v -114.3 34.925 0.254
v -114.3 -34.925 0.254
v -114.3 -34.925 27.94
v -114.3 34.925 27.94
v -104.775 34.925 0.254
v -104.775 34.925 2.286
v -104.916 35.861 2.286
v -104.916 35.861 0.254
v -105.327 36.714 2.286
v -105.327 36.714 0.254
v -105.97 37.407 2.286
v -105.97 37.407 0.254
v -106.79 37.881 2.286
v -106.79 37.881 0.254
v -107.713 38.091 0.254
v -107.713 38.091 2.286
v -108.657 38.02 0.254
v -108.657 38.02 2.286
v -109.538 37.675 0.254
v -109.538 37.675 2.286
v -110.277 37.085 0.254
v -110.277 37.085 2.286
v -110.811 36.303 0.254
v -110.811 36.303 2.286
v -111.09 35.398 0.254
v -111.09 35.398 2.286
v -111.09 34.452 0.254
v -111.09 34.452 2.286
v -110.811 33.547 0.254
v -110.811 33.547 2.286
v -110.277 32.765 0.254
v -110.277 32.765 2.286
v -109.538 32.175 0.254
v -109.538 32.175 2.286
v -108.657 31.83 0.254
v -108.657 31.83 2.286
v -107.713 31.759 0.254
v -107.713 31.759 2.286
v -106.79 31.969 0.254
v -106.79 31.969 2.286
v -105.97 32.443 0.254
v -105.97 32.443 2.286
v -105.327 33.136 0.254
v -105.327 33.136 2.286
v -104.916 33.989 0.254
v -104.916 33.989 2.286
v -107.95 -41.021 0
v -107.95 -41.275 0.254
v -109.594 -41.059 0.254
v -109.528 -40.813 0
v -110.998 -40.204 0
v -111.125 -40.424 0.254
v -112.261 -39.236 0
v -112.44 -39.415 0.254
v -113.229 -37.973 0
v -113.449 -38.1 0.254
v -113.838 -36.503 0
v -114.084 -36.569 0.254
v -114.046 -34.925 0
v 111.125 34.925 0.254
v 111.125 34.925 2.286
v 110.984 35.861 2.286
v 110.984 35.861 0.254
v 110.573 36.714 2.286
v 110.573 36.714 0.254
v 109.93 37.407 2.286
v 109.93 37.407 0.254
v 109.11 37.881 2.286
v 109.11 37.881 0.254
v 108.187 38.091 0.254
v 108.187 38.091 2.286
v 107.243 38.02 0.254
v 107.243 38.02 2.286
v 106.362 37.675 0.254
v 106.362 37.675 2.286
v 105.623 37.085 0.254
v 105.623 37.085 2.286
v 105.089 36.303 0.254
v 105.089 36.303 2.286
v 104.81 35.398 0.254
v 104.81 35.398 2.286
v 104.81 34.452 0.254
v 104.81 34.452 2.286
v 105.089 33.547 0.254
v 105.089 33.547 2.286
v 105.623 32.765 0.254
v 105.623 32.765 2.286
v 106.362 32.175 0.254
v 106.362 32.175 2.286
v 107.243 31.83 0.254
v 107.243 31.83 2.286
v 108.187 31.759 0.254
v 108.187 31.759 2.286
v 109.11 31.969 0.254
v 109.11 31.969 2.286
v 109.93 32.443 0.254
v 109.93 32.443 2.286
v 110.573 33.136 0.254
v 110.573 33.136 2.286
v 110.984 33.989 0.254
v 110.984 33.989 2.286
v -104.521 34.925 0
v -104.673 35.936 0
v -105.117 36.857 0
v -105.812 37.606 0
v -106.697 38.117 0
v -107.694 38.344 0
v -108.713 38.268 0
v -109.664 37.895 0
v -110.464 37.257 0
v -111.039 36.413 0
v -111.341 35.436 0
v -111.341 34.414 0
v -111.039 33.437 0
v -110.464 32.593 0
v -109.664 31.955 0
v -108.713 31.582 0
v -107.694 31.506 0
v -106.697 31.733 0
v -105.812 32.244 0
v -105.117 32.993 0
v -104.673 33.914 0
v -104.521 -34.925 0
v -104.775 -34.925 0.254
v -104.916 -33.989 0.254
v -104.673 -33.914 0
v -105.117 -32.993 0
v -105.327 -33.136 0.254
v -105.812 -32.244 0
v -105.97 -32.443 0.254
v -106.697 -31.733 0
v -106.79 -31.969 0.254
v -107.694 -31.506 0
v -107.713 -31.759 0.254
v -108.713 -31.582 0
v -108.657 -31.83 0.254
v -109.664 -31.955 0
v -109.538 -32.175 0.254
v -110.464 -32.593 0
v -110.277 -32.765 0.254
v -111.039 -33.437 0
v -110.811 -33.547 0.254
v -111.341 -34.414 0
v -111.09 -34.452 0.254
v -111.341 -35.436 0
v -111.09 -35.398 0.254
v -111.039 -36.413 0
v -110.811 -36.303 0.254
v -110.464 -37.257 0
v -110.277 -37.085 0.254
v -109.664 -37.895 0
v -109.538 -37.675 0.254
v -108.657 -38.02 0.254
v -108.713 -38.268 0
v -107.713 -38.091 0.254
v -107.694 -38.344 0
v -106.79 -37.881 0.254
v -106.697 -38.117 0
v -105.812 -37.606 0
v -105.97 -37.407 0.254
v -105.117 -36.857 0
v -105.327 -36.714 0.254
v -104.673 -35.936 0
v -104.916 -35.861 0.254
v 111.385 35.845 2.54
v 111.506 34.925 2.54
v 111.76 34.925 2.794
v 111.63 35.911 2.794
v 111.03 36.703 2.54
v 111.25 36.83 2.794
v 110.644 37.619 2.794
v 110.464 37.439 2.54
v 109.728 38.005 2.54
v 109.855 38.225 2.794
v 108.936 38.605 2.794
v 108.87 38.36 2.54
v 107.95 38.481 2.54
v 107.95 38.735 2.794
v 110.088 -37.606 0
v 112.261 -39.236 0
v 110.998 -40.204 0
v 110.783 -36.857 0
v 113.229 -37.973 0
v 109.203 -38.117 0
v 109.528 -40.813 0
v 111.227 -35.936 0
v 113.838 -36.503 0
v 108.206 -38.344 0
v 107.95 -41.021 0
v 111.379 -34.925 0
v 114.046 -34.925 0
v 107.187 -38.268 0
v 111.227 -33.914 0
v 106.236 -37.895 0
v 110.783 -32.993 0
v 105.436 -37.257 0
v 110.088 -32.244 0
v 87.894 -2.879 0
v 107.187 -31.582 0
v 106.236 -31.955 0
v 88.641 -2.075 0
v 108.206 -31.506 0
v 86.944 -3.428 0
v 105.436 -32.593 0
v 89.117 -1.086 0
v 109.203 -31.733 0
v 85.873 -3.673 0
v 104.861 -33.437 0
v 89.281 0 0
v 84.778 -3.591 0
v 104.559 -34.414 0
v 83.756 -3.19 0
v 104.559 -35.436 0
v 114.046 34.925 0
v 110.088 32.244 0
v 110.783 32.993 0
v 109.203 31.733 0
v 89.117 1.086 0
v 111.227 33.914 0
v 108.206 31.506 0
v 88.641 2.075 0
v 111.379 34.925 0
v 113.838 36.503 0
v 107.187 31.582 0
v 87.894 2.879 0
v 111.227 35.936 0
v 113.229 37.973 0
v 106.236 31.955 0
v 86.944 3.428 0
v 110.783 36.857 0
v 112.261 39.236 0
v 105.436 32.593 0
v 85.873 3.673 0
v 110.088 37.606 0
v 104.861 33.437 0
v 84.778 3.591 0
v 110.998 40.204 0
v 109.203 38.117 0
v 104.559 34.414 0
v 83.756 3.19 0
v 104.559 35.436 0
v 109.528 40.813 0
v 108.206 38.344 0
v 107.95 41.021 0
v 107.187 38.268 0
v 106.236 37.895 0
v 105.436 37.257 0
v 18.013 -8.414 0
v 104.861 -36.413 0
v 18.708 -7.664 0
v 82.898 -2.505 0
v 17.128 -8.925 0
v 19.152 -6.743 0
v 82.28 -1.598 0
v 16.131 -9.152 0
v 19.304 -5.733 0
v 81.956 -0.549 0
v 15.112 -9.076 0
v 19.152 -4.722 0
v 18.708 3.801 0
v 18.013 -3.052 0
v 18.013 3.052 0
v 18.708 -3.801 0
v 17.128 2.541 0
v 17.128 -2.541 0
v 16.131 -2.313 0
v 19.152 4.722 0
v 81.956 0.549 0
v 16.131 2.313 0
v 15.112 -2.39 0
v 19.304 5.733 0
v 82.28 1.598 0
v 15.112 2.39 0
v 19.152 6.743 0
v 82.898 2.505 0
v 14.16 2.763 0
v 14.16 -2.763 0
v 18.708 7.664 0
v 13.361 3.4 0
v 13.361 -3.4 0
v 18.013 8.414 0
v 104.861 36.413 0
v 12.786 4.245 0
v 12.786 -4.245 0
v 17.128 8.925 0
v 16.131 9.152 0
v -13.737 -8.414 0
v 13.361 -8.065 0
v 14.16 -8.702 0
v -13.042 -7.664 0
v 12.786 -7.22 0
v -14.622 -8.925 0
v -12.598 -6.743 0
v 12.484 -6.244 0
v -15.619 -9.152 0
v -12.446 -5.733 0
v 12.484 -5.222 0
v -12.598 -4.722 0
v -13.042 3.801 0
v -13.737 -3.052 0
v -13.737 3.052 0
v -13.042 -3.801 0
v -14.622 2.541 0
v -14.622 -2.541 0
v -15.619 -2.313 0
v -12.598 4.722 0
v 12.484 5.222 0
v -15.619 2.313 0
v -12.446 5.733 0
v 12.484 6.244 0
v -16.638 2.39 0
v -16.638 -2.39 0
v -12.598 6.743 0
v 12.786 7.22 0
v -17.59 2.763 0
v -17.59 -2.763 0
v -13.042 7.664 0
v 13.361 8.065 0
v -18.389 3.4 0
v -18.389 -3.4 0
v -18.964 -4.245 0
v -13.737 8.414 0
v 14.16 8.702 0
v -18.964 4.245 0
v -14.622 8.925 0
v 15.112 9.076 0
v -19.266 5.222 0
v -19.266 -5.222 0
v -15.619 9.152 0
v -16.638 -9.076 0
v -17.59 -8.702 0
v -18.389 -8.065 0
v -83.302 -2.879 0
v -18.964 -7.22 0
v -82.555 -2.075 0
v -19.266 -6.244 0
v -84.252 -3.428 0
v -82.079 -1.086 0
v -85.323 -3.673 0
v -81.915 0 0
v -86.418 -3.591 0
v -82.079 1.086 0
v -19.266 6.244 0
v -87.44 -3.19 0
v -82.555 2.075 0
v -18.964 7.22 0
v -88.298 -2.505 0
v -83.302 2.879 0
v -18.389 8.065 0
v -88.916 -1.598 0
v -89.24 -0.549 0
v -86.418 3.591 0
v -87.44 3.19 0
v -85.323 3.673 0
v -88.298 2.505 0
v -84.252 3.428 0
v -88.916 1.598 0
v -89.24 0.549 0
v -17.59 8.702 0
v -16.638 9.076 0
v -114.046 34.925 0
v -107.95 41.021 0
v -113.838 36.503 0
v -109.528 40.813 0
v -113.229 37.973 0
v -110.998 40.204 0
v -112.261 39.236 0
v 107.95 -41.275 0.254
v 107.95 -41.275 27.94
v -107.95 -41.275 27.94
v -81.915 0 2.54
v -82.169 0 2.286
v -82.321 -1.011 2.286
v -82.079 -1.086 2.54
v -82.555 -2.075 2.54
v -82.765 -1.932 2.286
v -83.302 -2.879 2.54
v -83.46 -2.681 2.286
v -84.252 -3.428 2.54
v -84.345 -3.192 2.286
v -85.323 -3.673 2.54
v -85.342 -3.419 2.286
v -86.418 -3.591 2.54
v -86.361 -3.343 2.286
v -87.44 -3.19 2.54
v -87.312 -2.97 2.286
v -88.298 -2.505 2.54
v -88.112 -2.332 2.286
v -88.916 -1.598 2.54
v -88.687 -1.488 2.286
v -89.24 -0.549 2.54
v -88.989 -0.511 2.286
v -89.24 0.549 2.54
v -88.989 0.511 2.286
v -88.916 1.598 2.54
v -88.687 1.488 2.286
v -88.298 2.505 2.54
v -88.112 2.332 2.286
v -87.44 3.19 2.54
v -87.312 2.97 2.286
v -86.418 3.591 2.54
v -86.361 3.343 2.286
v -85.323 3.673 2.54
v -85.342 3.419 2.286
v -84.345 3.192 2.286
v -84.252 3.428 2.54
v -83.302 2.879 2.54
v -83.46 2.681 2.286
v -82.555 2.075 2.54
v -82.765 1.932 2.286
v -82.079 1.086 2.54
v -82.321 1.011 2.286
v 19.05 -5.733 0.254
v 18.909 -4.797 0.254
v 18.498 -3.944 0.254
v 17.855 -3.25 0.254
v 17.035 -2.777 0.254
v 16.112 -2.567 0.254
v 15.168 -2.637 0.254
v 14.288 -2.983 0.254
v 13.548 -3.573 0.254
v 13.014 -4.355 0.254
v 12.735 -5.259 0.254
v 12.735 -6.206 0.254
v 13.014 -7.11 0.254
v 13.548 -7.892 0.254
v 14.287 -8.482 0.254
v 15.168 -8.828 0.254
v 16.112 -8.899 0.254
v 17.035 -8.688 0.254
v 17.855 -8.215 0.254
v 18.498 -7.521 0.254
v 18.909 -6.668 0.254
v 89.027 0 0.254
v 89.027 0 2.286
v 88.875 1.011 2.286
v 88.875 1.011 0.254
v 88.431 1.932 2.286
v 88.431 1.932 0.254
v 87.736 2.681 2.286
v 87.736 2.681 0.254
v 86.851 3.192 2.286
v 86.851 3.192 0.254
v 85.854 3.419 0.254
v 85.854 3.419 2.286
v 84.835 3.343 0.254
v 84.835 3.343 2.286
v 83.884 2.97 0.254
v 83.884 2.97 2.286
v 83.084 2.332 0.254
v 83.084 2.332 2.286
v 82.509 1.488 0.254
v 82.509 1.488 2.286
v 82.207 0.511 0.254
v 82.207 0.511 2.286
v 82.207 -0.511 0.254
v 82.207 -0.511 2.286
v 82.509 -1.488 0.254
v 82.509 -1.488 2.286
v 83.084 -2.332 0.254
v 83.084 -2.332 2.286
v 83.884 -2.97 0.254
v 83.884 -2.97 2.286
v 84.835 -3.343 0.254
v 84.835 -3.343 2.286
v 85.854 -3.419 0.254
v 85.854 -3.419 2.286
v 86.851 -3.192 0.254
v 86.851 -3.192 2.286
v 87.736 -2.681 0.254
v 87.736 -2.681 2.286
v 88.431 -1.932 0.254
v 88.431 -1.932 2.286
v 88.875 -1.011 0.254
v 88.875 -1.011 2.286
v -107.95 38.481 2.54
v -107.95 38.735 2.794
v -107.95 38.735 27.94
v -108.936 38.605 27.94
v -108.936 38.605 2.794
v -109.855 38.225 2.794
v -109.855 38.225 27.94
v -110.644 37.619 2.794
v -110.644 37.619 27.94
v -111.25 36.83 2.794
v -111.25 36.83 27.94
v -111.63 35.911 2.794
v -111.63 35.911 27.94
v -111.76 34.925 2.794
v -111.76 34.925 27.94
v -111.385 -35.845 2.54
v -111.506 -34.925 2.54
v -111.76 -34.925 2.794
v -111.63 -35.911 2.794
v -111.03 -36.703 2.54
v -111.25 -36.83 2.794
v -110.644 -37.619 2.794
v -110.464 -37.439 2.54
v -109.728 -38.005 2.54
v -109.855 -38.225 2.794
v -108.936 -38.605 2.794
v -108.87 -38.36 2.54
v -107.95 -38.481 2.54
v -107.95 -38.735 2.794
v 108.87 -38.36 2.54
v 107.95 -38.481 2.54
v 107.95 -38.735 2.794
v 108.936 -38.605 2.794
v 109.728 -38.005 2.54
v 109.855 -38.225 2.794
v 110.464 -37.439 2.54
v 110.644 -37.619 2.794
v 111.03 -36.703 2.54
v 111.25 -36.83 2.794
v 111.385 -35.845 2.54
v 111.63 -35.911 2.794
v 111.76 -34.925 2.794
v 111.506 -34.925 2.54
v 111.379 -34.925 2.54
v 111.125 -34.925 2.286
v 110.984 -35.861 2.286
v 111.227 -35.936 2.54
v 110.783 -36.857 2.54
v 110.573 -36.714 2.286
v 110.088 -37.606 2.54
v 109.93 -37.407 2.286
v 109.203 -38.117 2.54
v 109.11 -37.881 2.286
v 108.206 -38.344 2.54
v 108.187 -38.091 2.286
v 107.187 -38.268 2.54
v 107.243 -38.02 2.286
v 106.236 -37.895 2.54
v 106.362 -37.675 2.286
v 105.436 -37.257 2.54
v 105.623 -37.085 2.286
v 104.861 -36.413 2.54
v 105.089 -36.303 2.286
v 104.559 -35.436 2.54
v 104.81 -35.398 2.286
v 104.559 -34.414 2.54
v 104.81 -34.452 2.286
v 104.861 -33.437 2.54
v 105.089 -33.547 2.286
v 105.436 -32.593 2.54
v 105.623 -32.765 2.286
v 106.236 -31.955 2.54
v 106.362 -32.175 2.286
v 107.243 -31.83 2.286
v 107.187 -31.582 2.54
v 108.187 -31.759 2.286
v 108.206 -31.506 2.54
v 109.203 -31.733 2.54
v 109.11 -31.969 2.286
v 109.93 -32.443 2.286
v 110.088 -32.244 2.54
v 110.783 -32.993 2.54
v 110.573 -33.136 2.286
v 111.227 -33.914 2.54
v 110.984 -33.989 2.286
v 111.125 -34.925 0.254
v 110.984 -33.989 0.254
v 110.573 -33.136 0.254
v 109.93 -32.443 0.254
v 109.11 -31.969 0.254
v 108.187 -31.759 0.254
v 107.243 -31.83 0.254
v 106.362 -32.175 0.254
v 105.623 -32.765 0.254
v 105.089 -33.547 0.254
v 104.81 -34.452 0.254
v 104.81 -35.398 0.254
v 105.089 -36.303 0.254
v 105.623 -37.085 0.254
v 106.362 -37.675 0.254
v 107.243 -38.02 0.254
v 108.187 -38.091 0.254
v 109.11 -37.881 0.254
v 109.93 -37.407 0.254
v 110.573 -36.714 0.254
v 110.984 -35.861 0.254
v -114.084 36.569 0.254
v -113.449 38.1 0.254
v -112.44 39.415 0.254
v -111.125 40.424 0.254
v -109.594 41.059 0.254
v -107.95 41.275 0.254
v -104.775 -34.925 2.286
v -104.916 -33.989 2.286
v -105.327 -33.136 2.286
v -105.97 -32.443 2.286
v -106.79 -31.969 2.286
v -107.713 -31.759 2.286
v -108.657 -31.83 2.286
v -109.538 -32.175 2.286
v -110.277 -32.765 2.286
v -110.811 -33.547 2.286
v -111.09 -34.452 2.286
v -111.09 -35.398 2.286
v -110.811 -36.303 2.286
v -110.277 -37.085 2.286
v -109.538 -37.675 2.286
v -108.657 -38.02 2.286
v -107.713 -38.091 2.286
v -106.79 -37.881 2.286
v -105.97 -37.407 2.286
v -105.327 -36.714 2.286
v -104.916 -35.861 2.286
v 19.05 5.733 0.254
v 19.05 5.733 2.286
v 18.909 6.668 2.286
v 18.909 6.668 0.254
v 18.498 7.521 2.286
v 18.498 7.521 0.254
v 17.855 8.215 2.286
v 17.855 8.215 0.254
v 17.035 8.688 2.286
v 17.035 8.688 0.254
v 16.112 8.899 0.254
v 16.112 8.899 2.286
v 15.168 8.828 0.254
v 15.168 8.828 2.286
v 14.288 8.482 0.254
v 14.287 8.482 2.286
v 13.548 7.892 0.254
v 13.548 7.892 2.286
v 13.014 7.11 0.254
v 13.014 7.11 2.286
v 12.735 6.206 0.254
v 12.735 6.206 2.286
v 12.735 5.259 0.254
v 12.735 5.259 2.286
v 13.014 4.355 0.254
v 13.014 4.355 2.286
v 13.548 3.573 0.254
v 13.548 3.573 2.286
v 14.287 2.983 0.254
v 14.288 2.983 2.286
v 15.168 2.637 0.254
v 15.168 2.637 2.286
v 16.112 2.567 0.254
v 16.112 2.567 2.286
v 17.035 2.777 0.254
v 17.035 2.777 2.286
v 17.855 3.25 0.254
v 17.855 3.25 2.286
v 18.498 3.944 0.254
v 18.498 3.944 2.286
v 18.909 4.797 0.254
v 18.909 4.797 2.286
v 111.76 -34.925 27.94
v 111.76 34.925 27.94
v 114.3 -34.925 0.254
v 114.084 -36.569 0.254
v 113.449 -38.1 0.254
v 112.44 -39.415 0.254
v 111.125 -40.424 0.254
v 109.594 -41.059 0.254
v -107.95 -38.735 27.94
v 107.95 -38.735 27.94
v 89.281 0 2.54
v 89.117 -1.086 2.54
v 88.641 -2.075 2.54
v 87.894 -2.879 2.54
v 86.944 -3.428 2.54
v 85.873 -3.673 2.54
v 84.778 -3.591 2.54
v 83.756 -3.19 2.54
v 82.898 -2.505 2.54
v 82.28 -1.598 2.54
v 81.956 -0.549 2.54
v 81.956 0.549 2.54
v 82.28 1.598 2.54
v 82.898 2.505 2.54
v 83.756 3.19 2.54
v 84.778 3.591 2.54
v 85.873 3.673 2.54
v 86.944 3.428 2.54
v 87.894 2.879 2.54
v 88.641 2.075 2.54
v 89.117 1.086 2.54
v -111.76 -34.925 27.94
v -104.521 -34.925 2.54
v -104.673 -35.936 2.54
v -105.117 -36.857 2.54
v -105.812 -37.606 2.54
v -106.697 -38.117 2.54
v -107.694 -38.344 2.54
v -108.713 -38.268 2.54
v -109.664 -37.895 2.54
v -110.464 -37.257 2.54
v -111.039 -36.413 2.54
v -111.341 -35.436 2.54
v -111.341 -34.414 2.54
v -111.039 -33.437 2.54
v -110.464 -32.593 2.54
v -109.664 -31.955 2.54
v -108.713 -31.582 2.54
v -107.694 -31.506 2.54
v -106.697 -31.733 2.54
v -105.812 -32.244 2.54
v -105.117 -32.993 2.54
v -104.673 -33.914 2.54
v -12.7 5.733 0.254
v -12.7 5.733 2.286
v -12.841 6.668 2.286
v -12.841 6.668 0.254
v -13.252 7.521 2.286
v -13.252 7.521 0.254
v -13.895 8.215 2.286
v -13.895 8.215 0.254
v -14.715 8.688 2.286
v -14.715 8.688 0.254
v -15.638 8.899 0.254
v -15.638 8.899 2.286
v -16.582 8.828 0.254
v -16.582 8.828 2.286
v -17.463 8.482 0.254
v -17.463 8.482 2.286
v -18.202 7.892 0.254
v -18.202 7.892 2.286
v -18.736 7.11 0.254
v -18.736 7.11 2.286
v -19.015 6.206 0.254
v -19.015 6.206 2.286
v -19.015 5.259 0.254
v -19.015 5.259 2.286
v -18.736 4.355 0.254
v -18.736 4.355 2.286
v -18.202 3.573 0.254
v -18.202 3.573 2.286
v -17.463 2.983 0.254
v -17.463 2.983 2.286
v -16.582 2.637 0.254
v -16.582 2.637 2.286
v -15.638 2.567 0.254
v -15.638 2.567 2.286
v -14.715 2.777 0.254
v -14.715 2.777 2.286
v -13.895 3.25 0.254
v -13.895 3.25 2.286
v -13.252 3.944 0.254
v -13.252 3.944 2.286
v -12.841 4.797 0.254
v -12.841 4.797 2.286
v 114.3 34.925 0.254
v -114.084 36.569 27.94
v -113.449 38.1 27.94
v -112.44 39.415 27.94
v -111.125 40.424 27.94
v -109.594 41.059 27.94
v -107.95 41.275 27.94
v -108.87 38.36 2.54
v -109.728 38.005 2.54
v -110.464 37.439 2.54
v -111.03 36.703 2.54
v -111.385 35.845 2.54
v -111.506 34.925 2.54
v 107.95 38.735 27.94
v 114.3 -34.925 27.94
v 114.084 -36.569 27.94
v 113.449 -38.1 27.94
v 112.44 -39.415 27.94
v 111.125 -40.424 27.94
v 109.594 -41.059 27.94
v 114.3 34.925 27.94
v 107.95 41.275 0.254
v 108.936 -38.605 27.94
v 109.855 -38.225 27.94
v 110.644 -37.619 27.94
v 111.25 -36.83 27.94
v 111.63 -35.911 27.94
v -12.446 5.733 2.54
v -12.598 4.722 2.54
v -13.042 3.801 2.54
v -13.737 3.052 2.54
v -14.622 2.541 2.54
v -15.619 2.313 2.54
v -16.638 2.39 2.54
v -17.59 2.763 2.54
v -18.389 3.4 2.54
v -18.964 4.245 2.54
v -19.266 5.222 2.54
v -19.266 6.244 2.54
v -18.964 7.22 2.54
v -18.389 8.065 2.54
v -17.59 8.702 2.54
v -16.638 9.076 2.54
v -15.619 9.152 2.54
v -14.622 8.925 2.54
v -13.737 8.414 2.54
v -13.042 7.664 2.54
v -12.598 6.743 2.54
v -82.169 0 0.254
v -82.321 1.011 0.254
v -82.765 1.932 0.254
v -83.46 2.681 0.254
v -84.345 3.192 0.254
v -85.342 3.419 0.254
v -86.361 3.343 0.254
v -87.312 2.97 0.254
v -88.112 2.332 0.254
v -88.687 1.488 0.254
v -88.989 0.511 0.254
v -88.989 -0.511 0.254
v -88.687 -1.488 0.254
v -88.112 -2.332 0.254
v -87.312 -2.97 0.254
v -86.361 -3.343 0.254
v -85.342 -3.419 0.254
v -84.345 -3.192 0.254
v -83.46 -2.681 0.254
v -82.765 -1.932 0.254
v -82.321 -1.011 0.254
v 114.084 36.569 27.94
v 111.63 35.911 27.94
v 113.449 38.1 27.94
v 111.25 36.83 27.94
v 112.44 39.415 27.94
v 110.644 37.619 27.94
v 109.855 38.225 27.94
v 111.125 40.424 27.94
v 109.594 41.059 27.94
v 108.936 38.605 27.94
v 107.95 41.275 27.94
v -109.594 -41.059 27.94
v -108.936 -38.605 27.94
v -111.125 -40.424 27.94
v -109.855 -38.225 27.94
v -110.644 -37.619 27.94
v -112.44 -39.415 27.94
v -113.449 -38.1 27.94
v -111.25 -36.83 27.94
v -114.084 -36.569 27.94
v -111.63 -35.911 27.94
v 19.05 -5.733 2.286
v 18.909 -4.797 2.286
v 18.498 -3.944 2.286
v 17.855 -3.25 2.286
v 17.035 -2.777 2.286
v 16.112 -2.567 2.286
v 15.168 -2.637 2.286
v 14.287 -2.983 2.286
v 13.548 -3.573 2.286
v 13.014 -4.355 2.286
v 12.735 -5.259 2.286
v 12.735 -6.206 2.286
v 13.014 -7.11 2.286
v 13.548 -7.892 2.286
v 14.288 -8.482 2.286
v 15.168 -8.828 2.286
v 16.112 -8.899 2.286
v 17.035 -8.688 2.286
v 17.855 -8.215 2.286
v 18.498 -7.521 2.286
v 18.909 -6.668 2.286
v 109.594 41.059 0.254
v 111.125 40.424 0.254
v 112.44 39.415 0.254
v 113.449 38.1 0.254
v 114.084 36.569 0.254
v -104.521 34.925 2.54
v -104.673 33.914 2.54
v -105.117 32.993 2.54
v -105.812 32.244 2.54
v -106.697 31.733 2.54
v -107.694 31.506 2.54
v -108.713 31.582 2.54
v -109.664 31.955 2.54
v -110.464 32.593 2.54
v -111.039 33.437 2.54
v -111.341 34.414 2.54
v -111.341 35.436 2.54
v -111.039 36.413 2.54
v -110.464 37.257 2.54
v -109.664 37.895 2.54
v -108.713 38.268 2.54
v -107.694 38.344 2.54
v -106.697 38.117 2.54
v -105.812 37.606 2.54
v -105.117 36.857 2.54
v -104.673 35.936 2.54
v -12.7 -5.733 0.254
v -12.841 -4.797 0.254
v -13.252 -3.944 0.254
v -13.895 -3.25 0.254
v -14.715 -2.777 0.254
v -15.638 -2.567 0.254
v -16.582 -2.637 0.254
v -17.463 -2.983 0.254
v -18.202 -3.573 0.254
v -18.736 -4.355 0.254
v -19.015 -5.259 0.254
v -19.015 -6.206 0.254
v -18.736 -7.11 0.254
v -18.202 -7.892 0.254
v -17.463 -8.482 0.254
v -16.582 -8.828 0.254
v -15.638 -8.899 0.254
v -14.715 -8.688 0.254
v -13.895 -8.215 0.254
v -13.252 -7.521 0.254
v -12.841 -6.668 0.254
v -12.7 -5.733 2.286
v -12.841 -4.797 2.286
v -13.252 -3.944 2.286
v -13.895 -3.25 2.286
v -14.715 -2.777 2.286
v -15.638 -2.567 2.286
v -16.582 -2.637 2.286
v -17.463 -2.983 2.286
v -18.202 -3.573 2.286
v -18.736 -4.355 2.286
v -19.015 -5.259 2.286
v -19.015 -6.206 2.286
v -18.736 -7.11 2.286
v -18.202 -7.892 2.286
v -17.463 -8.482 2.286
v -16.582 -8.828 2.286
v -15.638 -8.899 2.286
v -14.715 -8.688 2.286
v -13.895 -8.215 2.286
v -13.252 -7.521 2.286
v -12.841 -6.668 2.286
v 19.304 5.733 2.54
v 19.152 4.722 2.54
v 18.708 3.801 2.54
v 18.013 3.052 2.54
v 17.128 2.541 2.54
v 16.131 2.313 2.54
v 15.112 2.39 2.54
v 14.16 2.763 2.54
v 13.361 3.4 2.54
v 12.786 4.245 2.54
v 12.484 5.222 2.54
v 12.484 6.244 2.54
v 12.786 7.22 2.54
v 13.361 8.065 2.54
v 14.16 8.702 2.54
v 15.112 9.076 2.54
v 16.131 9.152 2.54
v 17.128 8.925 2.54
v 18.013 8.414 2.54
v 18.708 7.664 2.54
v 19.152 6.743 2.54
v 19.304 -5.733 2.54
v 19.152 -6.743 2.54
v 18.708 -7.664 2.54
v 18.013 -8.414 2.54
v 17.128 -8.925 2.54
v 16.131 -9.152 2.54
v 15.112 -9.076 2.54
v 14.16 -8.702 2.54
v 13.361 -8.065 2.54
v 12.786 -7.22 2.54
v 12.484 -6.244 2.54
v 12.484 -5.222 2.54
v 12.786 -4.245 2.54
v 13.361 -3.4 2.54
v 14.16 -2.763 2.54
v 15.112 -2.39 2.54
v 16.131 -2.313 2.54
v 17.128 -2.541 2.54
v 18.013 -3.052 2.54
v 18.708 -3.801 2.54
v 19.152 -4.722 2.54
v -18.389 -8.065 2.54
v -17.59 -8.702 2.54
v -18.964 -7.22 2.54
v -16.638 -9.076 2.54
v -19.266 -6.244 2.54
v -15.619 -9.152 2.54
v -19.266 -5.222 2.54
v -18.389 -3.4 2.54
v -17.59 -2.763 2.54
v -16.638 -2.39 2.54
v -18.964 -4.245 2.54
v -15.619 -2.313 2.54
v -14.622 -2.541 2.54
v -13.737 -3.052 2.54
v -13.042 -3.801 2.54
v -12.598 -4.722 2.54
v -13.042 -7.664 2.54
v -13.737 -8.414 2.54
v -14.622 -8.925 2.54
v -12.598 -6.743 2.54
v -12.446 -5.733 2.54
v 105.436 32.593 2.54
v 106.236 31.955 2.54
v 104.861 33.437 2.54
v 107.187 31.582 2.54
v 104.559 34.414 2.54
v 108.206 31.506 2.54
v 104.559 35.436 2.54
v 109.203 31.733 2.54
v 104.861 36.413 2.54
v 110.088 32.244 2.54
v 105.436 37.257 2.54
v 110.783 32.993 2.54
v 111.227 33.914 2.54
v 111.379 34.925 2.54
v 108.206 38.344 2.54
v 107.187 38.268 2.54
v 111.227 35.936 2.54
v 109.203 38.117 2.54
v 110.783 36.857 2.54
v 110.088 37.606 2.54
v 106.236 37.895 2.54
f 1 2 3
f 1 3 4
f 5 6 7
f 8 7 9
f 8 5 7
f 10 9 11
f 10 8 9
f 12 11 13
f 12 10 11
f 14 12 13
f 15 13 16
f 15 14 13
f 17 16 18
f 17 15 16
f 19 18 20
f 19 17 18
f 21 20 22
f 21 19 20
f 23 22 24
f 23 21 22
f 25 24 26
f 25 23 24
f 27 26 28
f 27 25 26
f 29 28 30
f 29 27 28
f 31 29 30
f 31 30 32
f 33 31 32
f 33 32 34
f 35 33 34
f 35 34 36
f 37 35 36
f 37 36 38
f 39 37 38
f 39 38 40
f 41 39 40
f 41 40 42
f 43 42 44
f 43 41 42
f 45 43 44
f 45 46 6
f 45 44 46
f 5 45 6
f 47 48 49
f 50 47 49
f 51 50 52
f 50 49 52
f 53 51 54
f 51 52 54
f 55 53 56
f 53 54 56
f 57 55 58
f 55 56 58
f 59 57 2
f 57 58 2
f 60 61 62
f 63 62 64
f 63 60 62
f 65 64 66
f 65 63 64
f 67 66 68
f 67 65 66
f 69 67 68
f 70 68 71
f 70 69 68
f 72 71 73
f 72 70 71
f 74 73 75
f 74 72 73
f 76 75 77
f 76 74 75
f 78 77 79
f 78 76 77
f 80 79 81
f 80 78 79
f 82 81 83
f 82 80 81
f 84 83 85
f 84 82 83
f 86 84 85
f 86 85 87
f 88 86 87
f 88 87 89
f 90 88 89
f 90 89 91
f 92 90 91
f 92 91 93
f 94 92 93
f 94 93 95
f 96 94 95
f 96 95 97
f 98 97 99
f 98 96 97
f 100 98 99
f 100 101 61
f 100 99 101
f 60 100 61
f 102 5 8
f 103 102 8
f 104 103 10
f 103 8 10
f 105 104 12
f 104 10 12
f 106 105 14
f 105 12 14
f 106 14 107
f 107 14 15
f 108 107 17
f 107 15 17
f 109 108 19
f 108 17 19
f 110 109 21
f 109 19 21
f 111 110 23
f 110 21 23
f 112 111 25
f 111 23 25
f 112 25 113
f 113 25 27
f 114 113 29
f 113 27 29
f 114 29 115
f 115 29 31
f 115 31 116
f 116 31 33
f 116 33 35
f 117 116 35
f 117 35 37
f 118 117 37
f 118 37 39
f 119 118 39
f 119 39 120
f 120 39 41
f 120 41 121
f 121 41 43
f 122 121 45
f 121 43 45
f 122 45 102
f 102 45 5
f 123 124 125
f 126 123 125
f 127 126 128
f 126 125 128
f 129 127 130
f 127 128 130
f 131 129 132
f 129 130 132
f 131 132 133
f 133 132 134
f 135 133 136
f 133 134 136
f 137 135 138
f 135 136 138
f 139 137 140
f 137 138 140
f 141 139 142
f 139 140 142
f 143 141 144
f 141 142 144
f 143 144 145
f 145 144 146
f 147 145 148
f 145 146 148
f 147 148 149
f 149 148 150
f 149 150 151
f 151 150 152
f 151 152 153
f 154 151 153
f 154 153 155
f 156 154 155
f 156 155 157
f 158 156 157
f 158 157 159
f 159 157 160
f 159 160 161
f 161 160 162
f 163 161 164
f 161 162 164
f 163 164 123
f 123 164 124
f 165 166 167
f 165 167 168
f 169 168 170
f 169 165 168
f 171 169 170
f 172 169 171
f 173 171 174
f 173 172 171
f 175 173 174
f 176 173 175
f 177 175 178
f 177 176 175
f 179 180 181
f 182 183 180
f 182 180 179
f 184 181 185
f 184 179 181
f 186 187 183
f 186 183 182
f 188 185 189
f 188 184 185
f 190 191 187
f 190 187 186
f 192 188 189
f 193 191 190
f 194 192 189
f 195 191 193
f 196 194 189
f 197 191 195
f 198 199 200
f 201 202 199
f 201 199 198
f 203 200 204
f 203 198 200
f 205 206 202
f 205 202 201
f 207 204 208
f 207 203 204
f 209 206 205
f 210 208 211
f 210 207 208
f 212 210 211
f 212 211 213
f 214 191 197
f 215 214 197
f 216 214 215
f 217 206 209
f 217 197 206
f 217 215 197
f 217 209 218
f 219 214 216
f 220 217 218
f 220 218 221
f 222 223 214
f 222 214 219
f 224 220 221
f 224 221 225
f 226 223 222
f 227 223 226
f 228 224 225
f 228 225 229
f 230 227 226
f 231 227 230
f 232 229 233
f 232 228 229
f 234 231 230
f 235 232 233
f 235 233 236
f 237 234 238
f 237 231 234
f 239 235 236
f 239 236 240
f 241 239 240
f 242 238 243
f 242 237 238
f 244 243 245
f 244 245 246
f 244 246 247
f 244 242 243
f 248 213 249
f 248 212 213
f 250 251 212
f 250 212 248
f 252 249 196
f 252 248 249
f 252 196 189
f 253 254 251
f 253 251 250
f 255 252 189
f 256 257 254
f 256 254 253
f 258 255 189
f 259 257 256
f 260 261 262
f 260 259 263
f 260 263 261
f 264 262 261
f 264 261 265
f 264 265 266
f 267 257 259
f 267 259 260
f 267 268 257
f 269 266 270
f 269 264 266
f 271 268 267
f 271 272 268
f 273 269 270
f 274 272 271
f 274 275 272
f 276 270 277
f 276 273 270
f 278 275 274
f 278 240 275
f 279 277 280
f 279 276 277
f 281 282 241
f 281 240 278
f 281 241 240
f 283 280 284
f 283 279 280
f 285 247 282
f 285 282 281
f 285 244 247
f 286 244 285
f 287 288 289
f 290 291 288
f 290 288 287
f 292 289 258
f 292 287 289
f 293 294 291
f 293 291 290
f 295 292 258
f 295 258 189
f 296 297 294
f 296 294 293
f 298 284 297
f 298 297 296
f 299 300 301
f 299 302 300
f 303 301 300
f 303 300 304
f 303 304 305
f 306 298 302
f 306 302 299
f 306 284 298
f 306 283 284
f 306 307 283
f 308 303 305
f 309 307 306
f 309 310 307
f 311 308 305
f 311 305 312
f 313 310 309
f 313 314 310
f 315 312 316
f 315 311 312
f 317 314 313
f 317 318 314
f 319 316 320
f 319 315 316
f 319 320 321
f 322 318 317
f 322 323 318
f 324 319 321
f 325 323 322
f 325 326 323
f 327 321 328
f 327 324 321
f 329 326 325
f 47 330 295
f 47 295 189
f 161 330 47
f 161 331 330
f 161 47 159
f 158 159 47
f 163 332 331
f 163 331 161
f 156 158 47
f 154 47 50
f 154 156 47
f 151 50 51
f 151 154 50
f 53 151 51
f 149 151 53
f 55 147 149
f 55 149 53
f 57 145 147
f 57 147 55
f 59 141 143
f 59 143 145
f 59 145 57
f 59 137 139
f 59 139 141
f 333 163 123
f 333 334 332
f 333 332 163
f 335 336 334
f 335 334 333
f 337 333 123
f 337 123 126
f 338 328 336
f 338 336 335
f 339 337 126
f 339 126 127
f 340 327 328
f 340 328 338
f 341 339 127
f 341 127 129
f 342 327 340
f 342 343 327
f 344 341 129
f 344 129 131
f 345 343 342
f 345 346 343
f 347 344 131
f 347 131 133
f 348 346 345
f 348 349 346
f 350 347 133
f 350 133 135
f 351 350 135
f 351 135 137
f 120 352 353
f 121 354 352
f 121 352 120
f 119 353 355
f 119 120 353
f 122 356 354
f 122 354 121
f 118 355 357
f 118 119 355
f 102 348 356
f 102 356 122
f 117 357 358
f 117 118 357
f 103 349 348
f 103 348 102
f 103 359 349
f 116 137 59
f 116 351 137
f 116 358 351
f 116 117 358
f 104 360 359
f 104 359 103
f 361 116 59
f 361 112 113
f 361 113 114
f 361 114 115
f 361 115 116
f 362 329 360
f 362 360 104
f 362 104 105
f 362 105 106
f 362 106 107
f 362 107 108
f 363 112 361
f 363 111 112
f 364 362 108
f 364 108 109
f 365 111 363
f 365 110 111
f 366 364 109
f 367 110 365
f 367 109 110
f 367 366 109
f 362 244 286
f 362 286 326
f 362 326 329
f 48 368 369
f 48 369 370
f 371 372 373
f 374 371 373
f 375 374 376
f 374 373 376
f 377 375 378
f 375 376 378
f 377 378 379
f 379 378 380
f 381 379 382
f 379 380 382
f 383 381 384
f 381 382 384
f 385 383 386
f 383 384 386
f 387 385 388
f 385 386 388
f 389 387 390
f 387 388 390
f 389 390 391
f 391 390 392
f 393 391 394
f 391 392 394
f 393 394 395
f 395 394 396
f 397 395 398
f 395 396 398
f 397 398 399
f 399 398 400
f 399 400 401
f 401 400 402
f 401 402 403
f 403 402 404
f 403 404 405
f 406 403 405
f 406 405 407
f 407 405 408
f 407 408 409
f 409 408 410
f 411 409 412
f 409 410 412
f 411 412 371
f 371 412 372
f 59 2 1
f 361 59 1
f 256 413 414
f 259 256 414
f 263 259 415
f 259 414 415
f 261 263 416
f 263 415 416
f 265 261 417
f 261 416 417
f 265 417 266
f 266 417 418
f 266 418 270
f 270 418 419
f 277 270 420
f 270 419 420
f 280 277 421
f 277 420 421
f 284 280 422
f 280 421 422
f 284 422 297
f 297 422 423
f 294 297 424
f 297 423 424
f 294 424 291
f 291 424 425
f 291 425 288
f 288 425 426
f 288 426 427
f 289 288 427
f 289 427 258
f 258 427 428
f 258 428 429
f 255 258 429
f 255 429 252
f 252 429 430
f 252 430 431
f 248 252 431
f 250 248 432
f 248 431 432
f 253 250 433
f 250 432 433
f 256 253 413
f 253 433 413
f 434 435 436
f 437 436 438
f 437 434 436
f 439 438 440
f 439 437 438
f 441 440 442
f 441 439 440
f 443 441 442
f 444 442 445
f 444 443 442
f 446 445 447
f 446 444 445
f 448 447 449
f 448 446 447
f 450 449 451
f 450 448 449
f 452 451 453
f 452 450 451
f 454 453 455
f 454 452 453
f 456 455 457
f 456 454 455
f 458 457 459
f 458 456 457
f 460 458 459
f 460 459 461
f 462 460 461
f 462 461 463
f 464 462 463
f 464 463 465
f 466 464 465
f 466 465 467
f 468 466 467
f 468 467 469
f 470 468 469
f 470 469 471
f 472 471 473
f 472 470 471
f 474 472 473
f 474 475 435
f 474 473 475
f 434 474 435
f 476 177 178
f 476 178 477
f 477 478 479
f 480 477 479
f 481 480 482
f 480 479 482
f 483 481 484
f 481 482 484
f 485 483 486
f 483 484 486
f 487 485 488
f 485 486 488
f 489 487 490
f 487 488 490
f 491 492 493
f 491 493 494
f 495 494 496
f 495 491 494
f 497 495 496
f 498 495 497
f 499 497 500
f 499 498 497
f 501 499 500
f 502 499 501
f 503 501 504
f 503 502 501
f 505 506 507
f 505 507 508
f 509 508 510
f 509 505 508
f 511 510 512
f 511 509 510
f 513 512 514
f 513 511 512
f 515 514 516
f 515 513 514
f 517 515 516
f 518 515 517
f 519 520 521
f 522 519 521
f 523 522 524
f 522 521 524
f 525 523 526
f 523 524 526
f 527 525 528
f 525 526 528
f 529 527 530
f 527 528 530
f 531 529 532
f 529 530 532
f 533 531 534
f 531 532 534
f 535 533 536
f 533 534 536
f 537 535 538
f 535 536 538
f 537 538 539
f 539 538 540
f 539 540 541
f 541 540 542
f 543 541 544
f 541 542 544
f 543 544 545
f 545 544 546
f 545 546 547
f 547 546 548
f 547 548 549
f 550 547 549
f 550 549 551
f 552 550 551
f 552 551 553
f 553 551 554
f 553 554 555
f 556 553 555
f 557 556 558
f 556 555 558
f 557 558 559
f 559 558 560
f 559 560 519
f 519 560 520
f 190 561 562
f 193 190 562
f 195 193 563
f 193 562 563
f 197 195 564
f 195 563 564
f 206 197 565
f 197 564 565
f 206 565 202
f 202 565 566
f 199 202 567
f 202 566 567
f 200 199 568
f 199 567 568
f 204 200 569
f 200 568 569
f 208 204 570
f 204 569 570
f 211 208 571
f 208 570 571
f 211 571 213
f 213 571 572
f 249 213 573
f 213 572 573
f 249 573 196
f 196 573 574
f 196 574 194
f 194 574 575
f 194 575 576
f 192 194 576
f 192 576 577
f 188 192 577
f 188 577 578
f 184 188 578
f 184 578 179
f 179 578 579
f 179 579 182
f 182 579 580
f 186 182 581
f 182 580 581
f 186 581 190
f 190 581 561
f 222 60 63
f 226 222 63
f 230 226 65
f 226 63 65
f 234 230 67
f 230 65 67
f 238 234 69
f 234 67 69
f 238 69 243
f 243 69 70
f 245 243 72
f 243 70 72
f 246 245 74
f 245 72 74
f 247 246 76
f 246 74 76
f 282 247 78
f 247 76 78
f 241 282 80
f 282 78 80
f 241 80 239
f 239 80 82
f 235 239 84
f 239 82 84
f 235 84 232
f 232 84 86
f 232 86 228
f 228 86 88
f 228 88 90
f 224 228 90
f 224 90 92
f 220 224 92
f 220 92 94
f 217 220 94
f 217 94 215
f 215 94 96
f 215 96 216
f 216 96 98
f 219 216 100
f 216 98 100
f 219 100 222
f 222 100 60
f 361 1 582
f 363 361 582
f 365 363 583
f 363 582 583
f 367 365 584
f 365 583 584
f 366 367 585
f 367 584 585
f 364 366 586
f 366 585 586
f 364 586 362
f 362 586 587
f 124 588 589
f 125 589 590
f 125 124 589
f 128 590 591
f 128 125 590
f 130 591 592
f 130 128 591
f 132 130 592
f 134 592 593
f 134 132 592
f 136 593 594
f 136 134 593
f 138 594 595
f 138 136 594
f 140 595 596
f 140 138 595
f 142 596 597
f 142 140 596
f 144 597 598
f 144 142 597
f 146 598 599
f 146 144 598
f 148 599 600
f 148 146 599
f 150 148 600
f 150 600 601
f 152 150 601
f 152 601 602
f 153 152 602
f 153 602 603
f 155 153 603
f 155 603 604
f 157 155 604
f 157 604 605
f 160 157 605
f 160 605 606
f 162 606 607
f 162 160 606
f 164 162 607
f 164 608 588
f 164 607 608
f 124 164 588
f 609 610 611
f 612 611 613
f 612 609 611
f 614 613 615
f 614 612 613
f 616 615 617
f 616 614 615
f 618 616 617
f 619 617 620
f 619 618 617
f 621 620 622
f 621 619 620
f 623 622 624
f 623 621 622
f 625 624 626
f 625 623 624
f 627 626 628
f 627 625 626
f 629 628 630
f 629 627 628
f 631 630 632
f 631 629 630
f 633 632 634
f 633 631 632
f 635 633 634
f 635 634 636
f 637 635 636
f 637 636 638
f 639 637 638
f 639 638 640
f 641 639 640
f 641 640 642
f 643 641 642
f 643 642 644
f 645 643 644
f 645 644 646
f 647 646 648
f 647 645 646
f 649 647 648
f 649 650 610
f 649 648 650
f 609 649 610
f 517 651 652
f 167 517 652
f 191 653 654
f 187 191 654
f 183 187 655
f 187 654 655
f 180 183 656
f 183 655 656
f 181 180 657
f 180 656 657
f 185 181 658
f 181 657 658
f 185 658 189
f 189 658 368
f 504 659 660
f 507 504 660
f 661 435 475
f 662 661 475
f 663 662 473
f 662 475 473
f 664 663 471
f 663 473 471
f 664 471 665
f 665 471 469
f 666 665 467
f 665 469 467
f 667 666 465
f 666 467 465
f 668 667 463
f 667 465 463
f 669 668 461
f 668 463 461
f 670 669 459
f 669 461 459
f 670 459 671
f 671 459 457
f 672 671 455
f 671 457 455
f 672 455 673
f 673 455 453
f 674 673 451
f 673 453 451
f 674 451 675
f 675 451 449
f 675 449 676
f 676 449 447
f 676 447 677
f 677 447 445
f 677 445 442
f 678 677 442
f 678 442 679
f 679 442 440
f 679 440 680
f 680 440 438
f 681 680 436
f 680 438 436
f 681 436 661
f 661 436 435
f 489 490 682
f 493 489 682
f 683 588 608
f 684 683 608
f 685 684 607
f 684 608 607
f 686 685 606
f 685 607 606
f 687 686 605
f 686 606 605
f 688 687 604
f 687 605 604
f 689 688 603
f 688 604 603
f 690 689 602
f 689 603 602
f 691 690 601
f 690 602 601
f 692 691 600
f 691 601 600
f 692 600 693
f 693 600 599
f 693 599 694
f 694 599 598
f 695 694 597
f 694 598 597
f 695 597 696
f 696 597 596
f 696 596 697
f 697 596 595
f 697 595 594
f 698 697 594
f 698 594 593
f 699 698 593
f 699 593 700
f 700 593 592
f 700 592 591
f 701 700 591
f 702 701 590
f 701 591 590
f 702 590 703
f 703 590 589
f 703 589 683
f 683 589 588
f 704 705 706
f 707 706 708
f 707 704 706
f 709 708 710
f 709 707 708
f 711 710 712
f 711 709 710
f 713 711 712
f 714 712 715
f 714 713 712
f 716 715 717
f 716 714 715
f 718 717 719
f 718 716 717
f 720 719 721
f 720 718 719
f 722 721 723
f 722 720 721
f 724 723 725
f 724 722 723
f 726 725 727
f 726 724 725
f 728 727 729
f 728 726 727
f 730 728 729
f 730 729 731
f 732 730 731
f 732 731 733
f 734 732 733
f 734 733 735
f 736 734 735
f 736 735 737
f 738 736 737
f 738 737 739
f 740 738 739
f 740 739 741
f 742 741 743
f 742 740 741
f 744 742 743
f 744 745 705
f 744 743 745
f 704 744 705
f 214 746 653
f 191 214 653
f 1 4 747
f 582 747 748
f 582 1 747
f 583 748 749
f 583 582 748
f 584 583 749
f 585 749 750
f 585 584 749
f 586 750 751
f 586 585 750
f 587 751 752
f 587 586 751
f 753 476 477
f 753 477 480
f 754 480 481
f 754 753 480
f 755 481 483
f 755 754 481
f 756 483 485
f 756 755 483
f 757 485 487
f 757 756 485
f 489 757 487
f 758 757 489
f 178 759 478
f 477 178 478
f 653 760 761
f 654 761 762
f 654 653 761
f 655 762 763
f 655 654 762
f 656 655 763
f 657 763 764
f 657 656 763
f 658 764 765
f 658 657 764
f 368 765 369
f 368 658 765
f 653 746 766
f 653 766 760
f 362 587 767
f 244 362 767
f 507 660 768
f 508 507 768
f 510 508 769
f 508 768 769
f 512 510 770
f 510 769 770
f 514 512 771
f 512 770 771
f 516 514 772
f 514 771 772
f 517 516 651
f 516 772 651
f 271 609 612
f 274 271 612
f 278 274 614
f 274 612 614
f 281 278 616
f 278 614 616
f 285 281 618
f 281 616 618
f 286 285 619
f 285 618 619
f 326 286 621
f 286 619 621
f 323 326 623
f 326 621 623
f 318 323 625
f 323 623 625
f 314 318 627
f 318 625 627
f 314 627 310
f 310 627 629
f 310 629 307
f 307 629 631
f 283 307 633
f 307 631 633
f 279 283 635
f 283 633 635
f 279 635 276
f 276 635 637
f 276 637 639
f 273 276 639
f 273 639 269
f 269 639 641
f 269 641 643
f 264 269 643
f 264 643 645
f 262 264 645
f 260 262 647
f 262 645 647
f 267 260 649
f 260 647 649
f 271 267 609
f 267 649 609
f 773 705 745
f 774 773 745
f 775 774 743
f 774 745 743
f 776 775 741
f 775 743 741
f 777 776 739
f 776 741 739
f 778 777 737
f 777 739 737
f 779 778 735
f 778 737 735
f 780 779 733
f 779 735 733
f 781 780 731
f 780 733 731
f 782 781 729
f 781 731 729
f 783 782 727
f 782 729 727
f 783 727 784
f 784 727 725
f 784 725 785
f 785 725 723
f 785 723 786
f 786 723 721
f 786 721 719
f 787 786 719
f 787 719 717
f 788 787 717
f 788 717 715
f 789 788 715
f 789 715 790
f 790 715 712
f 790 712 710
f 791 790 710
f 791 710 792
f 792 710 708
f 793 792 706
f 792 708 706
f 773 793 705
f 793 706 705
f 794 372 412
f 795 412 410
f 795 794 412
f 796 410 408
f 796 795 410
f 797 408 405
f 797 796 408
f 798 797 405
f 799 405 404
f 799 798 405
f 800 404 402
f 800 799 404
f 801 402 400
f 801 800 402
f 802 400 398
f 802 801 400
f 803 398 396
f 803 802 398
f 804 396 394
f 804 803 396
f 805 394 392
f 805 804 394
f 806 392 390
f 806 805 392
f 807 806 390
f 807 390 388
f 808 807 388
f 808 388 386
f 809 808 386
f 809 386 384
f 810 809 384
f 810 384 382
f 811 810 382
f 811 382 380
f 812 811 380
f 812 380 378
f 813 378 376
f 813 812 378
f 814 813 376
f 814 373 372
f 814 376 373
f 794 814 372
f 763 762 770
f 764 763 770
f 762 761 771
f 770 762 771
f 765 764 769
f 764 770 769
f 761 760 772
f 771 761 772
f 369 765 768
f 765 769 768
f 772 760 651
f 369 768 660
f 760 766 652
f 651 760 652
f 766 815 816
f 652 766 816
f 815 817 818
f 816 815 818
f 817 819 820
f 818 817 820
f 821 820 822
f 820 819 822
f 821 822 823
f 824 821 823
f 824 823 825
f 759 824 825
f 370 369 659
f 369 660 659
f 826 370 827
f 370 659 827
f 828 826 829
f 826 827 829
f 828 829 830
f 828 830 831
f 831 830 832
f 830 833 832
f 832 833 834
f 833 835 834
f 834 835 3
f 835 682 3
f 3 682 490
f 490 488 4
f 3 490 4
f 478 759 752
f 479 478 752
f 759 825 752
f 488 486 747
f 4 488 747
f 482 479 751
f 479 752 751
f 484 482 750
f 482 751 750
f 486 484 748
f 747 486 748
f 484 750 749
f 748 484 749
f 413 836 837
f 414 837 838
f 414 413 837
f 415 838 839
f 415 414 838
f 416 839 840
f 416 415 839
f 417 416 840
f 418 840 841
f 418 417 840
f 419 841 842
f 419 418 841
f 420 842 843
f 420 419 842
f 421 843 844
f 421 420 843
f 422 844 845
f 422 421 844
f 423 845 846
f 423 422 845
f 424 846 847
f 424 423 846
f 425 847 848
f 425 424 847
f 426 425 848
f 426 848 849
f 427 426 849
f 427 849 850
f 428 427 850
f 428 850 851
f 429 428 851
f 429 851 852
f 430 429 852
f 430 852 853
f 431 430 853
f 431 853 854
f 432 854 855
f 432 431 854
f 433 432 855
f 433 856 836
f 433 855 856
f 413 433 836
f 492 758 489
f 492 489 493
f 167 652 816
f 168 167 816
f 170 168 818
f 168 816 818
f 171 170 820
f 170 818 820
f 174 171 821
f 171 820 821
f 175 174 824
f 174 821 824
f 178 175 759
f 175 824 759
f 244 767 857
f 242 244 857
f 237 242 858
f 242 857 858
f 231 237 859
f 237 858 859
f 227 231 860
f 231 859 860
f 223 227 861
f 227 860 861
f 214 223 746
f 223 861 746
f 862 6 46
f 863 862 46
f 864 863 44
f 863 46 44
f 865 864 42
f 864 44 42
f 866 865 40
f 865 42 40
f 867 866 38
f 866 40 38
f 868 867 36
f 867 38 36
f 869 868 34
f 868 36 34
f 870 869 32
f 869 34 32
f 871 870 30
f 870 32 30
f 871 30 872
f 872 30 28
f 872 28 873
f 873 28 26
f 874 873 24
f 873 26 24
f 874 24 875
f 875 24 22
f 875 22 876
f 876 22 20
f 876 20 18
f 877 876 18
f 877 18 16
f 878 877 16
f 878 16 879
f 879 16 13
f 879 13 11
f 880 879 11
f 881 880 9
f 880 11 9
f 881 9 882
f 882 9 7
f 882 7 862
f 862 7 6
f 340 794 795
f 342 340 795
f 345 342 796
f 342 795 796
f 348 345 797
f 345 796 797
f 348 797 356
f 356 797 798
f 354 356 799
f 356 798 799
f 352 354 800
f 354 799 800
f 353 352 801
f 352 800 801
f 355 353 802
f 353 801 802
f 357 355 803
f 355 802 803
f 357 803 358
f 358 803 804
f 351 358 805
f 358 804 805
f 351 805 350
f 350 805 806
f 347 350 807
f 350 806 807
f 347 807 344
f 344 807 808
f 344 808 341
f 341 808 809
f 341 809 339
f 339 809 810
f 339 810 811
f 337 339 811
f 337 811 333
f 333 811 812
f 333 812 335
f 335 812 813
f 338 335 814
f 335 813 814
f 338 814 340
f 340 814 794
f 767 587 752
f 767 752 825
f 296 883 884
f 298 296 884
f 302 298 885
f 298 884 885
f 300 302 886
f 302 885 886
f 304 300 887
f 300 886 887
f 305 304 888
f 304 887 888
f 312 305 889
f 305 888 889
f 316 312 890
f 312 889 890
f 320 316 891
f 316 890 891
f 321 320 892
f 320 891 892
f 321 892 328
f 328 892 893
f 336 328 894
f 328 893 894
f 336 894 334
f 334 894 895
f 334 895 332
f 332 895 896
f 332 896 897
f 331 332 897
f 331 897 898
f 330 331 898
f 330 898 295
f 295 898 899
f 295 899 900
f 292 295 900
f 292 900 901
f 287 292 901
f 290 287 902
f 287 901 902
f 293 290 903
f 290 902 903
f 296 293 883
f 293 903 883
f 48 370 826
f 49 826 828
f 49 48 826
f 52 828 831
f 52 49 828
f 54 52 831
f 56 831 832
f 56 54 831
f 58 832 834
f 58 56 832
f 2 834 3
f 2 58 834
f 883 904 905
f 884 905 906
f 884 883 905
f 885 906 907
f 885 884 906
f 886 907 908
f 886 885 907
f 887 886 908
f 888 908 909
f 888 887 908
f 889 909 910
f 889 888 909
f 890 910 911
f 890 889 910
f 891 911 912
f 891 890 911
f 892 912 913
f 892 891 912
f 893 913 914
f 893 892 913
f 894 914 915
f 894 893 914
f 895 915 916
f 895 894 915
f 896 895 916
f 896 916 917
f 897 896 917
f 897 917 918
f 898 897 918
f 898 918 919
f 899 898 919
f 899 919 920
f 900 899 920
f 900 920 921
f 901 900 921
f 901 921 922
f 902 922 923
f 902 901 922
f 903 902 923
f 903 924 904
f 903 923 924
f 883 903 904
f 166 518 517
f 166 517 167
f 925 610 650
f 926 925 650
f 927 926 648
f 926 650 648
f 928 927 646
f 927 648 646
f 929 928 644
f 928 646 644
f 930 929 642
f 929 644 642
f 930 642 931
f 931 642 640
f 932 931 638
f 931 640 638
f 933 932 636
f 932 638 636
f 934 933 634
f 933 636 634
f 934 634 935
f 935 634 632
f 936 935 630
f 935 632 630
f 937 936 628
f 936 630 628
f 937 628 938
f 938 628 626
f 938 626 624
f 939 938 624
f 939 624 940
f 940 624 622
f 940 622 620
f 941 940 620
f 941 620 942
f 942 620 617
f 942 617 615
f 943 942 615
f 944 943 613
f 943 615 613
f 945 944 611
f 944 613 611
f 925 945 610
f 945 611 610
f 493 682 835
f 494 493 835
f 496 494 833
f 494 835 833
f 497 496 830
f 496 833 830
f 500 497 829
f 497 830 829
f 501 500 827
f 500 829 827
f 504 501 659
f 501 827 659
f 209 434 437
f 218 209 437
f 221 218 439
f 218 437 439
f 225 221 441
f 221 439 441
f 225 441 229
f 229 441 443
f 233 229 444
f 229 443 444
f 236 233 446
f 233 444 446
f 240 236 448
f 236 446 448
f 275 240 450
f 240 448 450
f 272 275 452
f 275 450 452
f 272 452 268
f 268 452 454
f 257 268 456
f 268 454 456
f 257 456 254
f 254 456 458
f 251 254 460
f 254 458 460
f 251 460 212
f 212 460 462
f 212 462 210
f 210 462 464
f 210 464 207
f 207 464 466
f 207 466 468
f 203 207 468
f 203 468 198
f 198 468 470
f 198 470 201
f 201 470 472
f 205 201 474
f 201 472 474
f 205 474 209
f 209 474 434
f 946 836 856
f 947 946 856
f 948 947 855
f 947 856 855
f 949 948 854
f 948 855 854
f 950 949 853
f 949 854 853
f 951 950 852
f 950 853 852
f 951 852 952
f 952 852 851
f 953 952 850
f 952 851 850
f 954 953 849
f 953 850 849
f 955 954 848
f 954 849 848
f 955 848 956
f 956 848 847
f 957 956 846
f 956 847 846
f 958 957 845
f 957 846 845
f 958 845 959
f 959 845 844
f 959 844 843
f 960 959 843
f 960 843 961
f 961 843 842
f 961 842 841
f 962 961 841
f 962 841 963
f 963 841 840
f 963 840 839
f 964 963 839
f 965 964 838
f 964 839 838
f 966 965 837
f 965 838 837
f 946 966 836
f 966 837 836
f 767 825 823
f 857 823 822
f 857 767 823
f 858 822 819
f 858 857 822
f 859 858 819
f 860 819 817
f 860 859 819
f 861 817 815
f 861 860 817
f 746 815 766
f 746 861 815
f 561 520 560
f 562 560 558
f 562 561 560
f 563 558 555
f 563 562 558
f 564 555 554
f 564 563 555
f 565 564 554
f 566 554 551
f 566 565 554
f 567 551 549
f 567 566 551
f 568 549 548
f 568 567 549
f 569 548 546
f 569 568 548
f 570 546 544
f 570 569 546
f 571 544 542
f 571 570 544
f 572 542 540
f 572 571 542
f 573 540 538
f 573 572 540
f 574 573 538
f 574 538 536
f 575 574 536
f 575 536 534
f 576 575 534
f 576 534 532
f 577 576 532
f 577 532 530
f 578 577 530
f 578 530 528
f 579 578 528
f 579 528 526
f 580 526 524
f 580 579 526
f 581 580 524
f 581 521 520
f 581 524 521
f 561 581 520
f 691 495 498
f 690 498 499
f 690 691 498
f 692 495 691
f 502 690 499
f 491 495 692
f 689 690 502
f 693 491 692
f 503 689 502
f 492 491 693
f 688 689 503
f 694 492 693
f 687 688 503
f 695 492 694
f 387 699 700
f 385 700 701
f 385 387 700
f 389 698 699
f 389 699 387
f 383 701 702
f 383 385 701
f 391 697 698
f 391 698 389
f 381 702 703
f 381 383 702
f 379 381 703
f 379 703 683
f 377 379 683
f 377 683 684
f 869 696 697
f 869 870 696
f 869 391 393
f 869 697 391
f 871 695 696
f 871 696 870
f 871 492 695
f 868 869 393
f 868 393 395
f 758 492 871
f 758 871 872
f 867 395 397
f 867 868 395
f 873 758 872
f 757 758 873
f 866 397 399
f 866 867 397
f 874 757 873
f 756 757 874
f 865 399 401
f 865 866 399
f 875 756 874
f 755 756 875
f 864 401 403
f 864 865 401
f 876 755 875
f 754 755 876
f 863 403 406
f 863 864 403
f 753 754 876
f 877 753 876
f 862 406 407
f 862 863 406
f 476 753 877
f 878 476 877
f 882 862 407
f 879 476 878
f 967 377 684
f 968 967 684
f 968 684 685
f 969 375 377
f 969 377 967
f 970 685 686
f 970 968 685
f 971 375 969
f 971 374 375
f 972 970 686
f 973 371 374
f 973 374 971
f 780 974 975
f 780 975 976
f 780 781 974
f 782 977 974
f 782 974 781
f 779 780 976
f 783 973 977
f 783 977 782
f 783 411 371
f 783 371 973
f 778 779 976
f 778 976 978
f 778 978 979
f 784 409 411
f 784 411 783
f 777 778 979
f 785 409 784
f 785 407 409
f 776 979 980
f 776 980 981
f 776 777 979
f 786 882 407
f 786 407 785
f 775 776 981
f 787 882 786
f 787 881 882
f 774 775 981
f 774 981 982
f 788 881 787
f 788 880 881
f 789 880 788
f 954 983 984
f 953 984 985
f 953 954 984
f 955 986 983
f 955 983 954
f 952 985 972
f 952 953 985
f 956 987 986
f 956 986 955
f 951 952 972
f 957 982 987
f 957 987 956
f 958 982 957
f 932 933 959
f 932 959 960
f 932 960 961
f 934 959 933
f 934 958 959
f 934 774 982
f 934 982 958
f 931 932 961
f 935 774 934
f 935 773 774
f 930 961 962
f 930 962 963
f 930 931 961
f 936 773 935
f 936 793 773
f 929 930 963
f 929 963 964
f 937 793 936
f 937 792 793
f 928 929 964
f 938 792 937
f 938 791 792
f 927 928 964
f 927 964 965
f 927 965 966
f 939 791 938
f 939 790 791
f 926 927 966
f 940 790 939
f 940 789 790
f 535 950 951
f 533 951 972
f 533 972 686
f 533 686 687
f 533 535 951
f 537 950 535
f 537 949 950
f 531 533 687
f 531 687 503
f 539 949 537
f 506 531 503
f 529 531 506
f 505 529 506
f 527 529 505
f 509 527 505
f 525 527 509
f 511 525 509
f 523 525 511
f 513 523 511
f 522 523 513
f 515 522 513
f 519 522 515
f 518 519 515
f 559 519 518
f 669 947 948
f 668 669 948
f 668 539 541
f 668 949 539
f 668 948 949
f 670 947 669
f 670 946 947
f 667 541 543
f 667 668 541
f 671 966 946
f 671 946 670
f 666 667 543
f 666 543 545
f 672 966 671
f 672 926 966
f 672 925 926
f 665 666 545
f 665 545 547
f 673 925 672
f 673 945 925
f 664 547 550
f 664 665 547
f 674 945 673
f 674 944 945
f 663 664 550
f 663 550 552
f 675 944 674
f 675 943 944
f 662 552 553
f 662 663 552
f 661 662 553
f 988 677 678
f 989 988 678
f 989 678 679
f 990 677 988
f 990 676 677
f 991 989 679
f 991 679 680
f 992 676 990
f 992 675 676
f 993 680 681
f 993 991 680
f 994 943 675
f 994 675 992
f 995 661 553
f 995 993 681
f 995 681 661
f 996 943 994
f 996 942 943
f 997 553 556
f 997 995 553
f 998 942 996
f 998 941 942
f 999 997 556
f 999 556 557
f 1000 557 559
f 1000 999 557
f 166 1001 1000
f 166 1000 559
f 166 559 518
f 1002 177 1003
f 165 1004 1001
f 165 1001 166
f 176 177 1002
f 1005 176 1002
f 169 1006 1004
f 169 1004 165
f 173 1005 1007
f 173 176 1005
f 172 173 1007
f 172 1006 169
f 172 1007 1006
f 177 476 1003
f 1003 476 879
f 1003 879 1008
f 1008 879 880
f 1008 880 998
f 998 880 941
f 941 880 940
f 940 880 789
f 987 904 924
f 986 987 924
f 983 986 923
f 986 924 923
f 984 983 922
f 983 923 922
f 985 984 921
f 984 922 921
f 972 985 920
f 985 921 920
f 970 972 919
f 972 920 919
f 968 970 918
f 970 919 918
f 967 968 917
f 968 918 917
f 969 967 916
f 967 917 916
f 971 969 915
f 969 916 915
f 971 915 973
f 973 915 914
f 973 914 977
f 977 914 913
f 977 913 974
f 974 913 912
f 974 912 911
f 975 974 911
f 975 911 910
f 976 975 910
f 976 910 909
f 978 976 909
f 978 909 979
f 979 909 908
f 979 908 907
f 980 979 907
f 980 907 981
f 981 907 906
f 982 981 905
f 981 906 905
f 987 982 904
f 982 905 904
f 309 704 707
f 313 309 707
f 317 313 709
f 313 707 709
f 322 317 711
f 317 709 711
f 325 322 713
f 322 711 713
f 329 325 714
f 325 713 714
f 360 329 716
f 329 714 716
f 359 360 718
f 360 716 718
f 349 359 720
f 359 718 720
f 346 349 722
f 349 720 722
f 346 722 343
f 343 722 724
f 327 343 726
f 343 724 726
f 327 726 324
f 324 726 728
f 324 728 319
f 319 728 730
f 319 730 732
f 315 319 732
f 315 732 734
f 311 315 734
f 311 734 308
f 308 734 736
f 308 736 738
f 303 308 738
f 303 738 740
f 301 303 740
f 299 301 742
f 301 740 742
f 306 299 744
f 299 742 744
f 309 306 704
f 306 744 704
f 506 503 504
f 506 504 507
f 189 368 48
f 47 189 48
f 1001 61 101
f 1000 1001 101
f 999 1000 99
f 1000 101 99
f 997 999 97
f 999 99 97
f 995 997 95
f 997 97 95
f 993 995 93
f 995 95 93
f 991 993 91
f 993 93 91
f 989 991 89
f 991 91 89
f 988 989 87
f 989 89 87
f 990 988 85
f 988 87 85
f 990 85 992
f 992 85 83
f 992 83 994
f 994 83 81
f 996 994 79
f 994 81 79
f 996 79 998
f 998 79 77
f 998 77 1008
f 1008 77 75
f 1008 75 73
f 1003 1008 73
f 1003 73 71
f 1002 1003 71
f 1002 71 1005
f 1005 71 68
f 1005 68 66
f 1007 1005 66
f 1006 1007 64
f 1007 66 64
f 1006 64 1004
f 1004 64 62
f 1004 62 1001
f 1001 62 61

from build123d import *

# Parameters (mm, degrees)
SKETCH3_R           = 3.175
SKETCH3_R_2         = 3.429
BOSS_EXTRUDE1_DEPTH = 27.94
CUT_EXTRUDE1_DEPTH  = 25.4
CHAMFER1_SIZE       = 0.254
CHAMFER2_SIZE       = 0.254


with BuildPart() as part:
    # Sketch3 → Boss-Extrude1 (new body)
    with BuildSketch(Plane.XY):
        with BuildLine():
            Line((107.95, -41.275), (-107.95, -41.275))
            ThreePointArc((-107.95, -41.275), (-112.440128061, -39.415128061), (-114.3, -34.925))
            Line((-114.3, -34.925), (-114.3, 34.925))
            ThreePointArc((-114.3, 34.925), (-112.440128061, 39.415128061), (-107.95, 41.275))
            Line((-107.95, 41.275), (107.95, 41.275))
            ThreePointArc((107.95, 41.275), (112.440128061, 39.415128061), (114.3, 34.925))
            Line((114.3, 34.925), (114.3, -34.925))
            ThreePointArc((114.3, -34.925), (112.440128061, -39.415128061), (107.95, -41.275))
        make_face()
        with Locations((-107.95, 34.925)):
            Circle(SKETCH3_R, mode=Mode.SUBTRACT)
        with Locations((-107.95, -34.925)):
            Circle(SKETCH3_R, mode=Mode.SUBTRACT)
        with Locations((107.95, -34.925)):
            Circle(SKETCH3_R, mode=Mode.SUBTRACT)
        with Locations((107.95, 34.925)):
            Circle(SKETCH3_R, mode=Mode.SUBTRACT)
        with Locations((-85.598, 0)):
            Circle(SKETCH3_R_2, mode=Mode.SUBTRACT)
        with Locations((85.598, 0)):
            Circle(SKETCH3_R_2, mode=Mode.SUBTRACT)
        with Locations((-15.875, 5.732638889)):
            Circle(SKETCH3_R, mode=Mode.SUBTRACT)
        with Locations((15.875, 5.732638889)):
            Circle(SKETCH3_R, mode=Mode.SUBTRACT)
        with Locations((15.875, -5.732638889)):
            Circle(SKETCH3_R, mode=Mode.SUBTRACT)
        with Locations((-15.875, -5.732638889)):
            Circle(SKETCH3_R, mode=Mode.SUBTRACT)
    extrude(amount=BOSS_EXTRUDE1_DEPTH)

    # Sketch4 → Cut-Extrude1 (cut)
    with BuildSketch(Plane.XY.offset(27.94)):
        with BuildLine():
            Line((107.95, 38.735), (-107.95, 38.735))
            ThreePointArc((-107.95, 38.735), (-110.644076836, 37.619076836), (-111.76, 34.925))
            Line((-111.76, 34.925), (-111.76, -34.925))
            ThreePointArc((-111.76, -34.925), (-110.644076836, -37.619076836), (-107.95, -38.735))
            Line((-107.95, -38.735), (107.95, -38.735))
            ThreePointArc((107.95, -38.735), (110.644076836, -37.619076836), (111.76, -34.925))
            Line((111.76, -34.925), (111.76, 34.925))
            ThreePointArc((111.76, 34.925), (110.644076836, 37.619076836), (107.95, 38.735))
        make_face()
    extrude(amount=-CUT_EXTRUDE1_DEPTH, mode=Mode.SUBTRACT)

    # Chamfer1
    chamfer1_edges = [part.edges().sort_by_distance(p)[0] for p in [
        (0, 41.275, 0),
        (112.440128061, 39.415128061, 0),
        (-89.027, 0, 0),
        (82.169, 0, 0),
        (-111.125, 34.925, 0),
        (-111.125, -34.925, 0),
        (104.775, -34.925, 0),
        (104.775, 34.925, 0),
        (-19.05, 5.732638889, 0),
        (12.7, 5.732638889, 0),
        (12.7, -5.732638889, 0),
        (-19.05, -5.732638889, 0),
        (114.3, 0, 0),
        (112.440128061, -39.415128061, 0),
        (0, -41.275, 0),
        (-112.440128061, -39.415128061, 0),
        (-114.3, 0, 0),
        (-112.440128061, 39.415128061, 0),
    ]]
    chamfer(chamfer1_edges, length=CHAMFER1_SIZE)

    # Chamfer2
    chamfer2_edges = [part.edges().sort_by_distance(p)[0] for p in [
        (111.76, 0, 2.54),
        (110.644076836, -37.619076836, 2.54),
        (0, -38.735, 2.54),
        (-110.644076836, -37.619076836, 2.54),
        (-111.76, 0, 2.54),
        (-110.644076836, 37.619076836, 2.54),
        (0, 38.735, 2.54),
        (110.644076836, 37.619076836, 2.54),
        (-89.027, 0, 2.54),
        (82.169, 0, 2.54),
        (-111.125, 34.925, 2.54),
        (-111.125, -34.925, 2.54),
        (104.775, -34.925, 2.54),
        (104.775, 34.925, 2.54),
        (-19.05, 5.732638889, 2.54),
        (12.7, 5.732638889, 2.54),
        (12.7, -5.732638889, 2.54),
        (-19.05, -5.732638889, 2.54),
    ]]
    chamfer(chamfer2_edges, length=CHAMFER2_SIZE)


solid = part.part
